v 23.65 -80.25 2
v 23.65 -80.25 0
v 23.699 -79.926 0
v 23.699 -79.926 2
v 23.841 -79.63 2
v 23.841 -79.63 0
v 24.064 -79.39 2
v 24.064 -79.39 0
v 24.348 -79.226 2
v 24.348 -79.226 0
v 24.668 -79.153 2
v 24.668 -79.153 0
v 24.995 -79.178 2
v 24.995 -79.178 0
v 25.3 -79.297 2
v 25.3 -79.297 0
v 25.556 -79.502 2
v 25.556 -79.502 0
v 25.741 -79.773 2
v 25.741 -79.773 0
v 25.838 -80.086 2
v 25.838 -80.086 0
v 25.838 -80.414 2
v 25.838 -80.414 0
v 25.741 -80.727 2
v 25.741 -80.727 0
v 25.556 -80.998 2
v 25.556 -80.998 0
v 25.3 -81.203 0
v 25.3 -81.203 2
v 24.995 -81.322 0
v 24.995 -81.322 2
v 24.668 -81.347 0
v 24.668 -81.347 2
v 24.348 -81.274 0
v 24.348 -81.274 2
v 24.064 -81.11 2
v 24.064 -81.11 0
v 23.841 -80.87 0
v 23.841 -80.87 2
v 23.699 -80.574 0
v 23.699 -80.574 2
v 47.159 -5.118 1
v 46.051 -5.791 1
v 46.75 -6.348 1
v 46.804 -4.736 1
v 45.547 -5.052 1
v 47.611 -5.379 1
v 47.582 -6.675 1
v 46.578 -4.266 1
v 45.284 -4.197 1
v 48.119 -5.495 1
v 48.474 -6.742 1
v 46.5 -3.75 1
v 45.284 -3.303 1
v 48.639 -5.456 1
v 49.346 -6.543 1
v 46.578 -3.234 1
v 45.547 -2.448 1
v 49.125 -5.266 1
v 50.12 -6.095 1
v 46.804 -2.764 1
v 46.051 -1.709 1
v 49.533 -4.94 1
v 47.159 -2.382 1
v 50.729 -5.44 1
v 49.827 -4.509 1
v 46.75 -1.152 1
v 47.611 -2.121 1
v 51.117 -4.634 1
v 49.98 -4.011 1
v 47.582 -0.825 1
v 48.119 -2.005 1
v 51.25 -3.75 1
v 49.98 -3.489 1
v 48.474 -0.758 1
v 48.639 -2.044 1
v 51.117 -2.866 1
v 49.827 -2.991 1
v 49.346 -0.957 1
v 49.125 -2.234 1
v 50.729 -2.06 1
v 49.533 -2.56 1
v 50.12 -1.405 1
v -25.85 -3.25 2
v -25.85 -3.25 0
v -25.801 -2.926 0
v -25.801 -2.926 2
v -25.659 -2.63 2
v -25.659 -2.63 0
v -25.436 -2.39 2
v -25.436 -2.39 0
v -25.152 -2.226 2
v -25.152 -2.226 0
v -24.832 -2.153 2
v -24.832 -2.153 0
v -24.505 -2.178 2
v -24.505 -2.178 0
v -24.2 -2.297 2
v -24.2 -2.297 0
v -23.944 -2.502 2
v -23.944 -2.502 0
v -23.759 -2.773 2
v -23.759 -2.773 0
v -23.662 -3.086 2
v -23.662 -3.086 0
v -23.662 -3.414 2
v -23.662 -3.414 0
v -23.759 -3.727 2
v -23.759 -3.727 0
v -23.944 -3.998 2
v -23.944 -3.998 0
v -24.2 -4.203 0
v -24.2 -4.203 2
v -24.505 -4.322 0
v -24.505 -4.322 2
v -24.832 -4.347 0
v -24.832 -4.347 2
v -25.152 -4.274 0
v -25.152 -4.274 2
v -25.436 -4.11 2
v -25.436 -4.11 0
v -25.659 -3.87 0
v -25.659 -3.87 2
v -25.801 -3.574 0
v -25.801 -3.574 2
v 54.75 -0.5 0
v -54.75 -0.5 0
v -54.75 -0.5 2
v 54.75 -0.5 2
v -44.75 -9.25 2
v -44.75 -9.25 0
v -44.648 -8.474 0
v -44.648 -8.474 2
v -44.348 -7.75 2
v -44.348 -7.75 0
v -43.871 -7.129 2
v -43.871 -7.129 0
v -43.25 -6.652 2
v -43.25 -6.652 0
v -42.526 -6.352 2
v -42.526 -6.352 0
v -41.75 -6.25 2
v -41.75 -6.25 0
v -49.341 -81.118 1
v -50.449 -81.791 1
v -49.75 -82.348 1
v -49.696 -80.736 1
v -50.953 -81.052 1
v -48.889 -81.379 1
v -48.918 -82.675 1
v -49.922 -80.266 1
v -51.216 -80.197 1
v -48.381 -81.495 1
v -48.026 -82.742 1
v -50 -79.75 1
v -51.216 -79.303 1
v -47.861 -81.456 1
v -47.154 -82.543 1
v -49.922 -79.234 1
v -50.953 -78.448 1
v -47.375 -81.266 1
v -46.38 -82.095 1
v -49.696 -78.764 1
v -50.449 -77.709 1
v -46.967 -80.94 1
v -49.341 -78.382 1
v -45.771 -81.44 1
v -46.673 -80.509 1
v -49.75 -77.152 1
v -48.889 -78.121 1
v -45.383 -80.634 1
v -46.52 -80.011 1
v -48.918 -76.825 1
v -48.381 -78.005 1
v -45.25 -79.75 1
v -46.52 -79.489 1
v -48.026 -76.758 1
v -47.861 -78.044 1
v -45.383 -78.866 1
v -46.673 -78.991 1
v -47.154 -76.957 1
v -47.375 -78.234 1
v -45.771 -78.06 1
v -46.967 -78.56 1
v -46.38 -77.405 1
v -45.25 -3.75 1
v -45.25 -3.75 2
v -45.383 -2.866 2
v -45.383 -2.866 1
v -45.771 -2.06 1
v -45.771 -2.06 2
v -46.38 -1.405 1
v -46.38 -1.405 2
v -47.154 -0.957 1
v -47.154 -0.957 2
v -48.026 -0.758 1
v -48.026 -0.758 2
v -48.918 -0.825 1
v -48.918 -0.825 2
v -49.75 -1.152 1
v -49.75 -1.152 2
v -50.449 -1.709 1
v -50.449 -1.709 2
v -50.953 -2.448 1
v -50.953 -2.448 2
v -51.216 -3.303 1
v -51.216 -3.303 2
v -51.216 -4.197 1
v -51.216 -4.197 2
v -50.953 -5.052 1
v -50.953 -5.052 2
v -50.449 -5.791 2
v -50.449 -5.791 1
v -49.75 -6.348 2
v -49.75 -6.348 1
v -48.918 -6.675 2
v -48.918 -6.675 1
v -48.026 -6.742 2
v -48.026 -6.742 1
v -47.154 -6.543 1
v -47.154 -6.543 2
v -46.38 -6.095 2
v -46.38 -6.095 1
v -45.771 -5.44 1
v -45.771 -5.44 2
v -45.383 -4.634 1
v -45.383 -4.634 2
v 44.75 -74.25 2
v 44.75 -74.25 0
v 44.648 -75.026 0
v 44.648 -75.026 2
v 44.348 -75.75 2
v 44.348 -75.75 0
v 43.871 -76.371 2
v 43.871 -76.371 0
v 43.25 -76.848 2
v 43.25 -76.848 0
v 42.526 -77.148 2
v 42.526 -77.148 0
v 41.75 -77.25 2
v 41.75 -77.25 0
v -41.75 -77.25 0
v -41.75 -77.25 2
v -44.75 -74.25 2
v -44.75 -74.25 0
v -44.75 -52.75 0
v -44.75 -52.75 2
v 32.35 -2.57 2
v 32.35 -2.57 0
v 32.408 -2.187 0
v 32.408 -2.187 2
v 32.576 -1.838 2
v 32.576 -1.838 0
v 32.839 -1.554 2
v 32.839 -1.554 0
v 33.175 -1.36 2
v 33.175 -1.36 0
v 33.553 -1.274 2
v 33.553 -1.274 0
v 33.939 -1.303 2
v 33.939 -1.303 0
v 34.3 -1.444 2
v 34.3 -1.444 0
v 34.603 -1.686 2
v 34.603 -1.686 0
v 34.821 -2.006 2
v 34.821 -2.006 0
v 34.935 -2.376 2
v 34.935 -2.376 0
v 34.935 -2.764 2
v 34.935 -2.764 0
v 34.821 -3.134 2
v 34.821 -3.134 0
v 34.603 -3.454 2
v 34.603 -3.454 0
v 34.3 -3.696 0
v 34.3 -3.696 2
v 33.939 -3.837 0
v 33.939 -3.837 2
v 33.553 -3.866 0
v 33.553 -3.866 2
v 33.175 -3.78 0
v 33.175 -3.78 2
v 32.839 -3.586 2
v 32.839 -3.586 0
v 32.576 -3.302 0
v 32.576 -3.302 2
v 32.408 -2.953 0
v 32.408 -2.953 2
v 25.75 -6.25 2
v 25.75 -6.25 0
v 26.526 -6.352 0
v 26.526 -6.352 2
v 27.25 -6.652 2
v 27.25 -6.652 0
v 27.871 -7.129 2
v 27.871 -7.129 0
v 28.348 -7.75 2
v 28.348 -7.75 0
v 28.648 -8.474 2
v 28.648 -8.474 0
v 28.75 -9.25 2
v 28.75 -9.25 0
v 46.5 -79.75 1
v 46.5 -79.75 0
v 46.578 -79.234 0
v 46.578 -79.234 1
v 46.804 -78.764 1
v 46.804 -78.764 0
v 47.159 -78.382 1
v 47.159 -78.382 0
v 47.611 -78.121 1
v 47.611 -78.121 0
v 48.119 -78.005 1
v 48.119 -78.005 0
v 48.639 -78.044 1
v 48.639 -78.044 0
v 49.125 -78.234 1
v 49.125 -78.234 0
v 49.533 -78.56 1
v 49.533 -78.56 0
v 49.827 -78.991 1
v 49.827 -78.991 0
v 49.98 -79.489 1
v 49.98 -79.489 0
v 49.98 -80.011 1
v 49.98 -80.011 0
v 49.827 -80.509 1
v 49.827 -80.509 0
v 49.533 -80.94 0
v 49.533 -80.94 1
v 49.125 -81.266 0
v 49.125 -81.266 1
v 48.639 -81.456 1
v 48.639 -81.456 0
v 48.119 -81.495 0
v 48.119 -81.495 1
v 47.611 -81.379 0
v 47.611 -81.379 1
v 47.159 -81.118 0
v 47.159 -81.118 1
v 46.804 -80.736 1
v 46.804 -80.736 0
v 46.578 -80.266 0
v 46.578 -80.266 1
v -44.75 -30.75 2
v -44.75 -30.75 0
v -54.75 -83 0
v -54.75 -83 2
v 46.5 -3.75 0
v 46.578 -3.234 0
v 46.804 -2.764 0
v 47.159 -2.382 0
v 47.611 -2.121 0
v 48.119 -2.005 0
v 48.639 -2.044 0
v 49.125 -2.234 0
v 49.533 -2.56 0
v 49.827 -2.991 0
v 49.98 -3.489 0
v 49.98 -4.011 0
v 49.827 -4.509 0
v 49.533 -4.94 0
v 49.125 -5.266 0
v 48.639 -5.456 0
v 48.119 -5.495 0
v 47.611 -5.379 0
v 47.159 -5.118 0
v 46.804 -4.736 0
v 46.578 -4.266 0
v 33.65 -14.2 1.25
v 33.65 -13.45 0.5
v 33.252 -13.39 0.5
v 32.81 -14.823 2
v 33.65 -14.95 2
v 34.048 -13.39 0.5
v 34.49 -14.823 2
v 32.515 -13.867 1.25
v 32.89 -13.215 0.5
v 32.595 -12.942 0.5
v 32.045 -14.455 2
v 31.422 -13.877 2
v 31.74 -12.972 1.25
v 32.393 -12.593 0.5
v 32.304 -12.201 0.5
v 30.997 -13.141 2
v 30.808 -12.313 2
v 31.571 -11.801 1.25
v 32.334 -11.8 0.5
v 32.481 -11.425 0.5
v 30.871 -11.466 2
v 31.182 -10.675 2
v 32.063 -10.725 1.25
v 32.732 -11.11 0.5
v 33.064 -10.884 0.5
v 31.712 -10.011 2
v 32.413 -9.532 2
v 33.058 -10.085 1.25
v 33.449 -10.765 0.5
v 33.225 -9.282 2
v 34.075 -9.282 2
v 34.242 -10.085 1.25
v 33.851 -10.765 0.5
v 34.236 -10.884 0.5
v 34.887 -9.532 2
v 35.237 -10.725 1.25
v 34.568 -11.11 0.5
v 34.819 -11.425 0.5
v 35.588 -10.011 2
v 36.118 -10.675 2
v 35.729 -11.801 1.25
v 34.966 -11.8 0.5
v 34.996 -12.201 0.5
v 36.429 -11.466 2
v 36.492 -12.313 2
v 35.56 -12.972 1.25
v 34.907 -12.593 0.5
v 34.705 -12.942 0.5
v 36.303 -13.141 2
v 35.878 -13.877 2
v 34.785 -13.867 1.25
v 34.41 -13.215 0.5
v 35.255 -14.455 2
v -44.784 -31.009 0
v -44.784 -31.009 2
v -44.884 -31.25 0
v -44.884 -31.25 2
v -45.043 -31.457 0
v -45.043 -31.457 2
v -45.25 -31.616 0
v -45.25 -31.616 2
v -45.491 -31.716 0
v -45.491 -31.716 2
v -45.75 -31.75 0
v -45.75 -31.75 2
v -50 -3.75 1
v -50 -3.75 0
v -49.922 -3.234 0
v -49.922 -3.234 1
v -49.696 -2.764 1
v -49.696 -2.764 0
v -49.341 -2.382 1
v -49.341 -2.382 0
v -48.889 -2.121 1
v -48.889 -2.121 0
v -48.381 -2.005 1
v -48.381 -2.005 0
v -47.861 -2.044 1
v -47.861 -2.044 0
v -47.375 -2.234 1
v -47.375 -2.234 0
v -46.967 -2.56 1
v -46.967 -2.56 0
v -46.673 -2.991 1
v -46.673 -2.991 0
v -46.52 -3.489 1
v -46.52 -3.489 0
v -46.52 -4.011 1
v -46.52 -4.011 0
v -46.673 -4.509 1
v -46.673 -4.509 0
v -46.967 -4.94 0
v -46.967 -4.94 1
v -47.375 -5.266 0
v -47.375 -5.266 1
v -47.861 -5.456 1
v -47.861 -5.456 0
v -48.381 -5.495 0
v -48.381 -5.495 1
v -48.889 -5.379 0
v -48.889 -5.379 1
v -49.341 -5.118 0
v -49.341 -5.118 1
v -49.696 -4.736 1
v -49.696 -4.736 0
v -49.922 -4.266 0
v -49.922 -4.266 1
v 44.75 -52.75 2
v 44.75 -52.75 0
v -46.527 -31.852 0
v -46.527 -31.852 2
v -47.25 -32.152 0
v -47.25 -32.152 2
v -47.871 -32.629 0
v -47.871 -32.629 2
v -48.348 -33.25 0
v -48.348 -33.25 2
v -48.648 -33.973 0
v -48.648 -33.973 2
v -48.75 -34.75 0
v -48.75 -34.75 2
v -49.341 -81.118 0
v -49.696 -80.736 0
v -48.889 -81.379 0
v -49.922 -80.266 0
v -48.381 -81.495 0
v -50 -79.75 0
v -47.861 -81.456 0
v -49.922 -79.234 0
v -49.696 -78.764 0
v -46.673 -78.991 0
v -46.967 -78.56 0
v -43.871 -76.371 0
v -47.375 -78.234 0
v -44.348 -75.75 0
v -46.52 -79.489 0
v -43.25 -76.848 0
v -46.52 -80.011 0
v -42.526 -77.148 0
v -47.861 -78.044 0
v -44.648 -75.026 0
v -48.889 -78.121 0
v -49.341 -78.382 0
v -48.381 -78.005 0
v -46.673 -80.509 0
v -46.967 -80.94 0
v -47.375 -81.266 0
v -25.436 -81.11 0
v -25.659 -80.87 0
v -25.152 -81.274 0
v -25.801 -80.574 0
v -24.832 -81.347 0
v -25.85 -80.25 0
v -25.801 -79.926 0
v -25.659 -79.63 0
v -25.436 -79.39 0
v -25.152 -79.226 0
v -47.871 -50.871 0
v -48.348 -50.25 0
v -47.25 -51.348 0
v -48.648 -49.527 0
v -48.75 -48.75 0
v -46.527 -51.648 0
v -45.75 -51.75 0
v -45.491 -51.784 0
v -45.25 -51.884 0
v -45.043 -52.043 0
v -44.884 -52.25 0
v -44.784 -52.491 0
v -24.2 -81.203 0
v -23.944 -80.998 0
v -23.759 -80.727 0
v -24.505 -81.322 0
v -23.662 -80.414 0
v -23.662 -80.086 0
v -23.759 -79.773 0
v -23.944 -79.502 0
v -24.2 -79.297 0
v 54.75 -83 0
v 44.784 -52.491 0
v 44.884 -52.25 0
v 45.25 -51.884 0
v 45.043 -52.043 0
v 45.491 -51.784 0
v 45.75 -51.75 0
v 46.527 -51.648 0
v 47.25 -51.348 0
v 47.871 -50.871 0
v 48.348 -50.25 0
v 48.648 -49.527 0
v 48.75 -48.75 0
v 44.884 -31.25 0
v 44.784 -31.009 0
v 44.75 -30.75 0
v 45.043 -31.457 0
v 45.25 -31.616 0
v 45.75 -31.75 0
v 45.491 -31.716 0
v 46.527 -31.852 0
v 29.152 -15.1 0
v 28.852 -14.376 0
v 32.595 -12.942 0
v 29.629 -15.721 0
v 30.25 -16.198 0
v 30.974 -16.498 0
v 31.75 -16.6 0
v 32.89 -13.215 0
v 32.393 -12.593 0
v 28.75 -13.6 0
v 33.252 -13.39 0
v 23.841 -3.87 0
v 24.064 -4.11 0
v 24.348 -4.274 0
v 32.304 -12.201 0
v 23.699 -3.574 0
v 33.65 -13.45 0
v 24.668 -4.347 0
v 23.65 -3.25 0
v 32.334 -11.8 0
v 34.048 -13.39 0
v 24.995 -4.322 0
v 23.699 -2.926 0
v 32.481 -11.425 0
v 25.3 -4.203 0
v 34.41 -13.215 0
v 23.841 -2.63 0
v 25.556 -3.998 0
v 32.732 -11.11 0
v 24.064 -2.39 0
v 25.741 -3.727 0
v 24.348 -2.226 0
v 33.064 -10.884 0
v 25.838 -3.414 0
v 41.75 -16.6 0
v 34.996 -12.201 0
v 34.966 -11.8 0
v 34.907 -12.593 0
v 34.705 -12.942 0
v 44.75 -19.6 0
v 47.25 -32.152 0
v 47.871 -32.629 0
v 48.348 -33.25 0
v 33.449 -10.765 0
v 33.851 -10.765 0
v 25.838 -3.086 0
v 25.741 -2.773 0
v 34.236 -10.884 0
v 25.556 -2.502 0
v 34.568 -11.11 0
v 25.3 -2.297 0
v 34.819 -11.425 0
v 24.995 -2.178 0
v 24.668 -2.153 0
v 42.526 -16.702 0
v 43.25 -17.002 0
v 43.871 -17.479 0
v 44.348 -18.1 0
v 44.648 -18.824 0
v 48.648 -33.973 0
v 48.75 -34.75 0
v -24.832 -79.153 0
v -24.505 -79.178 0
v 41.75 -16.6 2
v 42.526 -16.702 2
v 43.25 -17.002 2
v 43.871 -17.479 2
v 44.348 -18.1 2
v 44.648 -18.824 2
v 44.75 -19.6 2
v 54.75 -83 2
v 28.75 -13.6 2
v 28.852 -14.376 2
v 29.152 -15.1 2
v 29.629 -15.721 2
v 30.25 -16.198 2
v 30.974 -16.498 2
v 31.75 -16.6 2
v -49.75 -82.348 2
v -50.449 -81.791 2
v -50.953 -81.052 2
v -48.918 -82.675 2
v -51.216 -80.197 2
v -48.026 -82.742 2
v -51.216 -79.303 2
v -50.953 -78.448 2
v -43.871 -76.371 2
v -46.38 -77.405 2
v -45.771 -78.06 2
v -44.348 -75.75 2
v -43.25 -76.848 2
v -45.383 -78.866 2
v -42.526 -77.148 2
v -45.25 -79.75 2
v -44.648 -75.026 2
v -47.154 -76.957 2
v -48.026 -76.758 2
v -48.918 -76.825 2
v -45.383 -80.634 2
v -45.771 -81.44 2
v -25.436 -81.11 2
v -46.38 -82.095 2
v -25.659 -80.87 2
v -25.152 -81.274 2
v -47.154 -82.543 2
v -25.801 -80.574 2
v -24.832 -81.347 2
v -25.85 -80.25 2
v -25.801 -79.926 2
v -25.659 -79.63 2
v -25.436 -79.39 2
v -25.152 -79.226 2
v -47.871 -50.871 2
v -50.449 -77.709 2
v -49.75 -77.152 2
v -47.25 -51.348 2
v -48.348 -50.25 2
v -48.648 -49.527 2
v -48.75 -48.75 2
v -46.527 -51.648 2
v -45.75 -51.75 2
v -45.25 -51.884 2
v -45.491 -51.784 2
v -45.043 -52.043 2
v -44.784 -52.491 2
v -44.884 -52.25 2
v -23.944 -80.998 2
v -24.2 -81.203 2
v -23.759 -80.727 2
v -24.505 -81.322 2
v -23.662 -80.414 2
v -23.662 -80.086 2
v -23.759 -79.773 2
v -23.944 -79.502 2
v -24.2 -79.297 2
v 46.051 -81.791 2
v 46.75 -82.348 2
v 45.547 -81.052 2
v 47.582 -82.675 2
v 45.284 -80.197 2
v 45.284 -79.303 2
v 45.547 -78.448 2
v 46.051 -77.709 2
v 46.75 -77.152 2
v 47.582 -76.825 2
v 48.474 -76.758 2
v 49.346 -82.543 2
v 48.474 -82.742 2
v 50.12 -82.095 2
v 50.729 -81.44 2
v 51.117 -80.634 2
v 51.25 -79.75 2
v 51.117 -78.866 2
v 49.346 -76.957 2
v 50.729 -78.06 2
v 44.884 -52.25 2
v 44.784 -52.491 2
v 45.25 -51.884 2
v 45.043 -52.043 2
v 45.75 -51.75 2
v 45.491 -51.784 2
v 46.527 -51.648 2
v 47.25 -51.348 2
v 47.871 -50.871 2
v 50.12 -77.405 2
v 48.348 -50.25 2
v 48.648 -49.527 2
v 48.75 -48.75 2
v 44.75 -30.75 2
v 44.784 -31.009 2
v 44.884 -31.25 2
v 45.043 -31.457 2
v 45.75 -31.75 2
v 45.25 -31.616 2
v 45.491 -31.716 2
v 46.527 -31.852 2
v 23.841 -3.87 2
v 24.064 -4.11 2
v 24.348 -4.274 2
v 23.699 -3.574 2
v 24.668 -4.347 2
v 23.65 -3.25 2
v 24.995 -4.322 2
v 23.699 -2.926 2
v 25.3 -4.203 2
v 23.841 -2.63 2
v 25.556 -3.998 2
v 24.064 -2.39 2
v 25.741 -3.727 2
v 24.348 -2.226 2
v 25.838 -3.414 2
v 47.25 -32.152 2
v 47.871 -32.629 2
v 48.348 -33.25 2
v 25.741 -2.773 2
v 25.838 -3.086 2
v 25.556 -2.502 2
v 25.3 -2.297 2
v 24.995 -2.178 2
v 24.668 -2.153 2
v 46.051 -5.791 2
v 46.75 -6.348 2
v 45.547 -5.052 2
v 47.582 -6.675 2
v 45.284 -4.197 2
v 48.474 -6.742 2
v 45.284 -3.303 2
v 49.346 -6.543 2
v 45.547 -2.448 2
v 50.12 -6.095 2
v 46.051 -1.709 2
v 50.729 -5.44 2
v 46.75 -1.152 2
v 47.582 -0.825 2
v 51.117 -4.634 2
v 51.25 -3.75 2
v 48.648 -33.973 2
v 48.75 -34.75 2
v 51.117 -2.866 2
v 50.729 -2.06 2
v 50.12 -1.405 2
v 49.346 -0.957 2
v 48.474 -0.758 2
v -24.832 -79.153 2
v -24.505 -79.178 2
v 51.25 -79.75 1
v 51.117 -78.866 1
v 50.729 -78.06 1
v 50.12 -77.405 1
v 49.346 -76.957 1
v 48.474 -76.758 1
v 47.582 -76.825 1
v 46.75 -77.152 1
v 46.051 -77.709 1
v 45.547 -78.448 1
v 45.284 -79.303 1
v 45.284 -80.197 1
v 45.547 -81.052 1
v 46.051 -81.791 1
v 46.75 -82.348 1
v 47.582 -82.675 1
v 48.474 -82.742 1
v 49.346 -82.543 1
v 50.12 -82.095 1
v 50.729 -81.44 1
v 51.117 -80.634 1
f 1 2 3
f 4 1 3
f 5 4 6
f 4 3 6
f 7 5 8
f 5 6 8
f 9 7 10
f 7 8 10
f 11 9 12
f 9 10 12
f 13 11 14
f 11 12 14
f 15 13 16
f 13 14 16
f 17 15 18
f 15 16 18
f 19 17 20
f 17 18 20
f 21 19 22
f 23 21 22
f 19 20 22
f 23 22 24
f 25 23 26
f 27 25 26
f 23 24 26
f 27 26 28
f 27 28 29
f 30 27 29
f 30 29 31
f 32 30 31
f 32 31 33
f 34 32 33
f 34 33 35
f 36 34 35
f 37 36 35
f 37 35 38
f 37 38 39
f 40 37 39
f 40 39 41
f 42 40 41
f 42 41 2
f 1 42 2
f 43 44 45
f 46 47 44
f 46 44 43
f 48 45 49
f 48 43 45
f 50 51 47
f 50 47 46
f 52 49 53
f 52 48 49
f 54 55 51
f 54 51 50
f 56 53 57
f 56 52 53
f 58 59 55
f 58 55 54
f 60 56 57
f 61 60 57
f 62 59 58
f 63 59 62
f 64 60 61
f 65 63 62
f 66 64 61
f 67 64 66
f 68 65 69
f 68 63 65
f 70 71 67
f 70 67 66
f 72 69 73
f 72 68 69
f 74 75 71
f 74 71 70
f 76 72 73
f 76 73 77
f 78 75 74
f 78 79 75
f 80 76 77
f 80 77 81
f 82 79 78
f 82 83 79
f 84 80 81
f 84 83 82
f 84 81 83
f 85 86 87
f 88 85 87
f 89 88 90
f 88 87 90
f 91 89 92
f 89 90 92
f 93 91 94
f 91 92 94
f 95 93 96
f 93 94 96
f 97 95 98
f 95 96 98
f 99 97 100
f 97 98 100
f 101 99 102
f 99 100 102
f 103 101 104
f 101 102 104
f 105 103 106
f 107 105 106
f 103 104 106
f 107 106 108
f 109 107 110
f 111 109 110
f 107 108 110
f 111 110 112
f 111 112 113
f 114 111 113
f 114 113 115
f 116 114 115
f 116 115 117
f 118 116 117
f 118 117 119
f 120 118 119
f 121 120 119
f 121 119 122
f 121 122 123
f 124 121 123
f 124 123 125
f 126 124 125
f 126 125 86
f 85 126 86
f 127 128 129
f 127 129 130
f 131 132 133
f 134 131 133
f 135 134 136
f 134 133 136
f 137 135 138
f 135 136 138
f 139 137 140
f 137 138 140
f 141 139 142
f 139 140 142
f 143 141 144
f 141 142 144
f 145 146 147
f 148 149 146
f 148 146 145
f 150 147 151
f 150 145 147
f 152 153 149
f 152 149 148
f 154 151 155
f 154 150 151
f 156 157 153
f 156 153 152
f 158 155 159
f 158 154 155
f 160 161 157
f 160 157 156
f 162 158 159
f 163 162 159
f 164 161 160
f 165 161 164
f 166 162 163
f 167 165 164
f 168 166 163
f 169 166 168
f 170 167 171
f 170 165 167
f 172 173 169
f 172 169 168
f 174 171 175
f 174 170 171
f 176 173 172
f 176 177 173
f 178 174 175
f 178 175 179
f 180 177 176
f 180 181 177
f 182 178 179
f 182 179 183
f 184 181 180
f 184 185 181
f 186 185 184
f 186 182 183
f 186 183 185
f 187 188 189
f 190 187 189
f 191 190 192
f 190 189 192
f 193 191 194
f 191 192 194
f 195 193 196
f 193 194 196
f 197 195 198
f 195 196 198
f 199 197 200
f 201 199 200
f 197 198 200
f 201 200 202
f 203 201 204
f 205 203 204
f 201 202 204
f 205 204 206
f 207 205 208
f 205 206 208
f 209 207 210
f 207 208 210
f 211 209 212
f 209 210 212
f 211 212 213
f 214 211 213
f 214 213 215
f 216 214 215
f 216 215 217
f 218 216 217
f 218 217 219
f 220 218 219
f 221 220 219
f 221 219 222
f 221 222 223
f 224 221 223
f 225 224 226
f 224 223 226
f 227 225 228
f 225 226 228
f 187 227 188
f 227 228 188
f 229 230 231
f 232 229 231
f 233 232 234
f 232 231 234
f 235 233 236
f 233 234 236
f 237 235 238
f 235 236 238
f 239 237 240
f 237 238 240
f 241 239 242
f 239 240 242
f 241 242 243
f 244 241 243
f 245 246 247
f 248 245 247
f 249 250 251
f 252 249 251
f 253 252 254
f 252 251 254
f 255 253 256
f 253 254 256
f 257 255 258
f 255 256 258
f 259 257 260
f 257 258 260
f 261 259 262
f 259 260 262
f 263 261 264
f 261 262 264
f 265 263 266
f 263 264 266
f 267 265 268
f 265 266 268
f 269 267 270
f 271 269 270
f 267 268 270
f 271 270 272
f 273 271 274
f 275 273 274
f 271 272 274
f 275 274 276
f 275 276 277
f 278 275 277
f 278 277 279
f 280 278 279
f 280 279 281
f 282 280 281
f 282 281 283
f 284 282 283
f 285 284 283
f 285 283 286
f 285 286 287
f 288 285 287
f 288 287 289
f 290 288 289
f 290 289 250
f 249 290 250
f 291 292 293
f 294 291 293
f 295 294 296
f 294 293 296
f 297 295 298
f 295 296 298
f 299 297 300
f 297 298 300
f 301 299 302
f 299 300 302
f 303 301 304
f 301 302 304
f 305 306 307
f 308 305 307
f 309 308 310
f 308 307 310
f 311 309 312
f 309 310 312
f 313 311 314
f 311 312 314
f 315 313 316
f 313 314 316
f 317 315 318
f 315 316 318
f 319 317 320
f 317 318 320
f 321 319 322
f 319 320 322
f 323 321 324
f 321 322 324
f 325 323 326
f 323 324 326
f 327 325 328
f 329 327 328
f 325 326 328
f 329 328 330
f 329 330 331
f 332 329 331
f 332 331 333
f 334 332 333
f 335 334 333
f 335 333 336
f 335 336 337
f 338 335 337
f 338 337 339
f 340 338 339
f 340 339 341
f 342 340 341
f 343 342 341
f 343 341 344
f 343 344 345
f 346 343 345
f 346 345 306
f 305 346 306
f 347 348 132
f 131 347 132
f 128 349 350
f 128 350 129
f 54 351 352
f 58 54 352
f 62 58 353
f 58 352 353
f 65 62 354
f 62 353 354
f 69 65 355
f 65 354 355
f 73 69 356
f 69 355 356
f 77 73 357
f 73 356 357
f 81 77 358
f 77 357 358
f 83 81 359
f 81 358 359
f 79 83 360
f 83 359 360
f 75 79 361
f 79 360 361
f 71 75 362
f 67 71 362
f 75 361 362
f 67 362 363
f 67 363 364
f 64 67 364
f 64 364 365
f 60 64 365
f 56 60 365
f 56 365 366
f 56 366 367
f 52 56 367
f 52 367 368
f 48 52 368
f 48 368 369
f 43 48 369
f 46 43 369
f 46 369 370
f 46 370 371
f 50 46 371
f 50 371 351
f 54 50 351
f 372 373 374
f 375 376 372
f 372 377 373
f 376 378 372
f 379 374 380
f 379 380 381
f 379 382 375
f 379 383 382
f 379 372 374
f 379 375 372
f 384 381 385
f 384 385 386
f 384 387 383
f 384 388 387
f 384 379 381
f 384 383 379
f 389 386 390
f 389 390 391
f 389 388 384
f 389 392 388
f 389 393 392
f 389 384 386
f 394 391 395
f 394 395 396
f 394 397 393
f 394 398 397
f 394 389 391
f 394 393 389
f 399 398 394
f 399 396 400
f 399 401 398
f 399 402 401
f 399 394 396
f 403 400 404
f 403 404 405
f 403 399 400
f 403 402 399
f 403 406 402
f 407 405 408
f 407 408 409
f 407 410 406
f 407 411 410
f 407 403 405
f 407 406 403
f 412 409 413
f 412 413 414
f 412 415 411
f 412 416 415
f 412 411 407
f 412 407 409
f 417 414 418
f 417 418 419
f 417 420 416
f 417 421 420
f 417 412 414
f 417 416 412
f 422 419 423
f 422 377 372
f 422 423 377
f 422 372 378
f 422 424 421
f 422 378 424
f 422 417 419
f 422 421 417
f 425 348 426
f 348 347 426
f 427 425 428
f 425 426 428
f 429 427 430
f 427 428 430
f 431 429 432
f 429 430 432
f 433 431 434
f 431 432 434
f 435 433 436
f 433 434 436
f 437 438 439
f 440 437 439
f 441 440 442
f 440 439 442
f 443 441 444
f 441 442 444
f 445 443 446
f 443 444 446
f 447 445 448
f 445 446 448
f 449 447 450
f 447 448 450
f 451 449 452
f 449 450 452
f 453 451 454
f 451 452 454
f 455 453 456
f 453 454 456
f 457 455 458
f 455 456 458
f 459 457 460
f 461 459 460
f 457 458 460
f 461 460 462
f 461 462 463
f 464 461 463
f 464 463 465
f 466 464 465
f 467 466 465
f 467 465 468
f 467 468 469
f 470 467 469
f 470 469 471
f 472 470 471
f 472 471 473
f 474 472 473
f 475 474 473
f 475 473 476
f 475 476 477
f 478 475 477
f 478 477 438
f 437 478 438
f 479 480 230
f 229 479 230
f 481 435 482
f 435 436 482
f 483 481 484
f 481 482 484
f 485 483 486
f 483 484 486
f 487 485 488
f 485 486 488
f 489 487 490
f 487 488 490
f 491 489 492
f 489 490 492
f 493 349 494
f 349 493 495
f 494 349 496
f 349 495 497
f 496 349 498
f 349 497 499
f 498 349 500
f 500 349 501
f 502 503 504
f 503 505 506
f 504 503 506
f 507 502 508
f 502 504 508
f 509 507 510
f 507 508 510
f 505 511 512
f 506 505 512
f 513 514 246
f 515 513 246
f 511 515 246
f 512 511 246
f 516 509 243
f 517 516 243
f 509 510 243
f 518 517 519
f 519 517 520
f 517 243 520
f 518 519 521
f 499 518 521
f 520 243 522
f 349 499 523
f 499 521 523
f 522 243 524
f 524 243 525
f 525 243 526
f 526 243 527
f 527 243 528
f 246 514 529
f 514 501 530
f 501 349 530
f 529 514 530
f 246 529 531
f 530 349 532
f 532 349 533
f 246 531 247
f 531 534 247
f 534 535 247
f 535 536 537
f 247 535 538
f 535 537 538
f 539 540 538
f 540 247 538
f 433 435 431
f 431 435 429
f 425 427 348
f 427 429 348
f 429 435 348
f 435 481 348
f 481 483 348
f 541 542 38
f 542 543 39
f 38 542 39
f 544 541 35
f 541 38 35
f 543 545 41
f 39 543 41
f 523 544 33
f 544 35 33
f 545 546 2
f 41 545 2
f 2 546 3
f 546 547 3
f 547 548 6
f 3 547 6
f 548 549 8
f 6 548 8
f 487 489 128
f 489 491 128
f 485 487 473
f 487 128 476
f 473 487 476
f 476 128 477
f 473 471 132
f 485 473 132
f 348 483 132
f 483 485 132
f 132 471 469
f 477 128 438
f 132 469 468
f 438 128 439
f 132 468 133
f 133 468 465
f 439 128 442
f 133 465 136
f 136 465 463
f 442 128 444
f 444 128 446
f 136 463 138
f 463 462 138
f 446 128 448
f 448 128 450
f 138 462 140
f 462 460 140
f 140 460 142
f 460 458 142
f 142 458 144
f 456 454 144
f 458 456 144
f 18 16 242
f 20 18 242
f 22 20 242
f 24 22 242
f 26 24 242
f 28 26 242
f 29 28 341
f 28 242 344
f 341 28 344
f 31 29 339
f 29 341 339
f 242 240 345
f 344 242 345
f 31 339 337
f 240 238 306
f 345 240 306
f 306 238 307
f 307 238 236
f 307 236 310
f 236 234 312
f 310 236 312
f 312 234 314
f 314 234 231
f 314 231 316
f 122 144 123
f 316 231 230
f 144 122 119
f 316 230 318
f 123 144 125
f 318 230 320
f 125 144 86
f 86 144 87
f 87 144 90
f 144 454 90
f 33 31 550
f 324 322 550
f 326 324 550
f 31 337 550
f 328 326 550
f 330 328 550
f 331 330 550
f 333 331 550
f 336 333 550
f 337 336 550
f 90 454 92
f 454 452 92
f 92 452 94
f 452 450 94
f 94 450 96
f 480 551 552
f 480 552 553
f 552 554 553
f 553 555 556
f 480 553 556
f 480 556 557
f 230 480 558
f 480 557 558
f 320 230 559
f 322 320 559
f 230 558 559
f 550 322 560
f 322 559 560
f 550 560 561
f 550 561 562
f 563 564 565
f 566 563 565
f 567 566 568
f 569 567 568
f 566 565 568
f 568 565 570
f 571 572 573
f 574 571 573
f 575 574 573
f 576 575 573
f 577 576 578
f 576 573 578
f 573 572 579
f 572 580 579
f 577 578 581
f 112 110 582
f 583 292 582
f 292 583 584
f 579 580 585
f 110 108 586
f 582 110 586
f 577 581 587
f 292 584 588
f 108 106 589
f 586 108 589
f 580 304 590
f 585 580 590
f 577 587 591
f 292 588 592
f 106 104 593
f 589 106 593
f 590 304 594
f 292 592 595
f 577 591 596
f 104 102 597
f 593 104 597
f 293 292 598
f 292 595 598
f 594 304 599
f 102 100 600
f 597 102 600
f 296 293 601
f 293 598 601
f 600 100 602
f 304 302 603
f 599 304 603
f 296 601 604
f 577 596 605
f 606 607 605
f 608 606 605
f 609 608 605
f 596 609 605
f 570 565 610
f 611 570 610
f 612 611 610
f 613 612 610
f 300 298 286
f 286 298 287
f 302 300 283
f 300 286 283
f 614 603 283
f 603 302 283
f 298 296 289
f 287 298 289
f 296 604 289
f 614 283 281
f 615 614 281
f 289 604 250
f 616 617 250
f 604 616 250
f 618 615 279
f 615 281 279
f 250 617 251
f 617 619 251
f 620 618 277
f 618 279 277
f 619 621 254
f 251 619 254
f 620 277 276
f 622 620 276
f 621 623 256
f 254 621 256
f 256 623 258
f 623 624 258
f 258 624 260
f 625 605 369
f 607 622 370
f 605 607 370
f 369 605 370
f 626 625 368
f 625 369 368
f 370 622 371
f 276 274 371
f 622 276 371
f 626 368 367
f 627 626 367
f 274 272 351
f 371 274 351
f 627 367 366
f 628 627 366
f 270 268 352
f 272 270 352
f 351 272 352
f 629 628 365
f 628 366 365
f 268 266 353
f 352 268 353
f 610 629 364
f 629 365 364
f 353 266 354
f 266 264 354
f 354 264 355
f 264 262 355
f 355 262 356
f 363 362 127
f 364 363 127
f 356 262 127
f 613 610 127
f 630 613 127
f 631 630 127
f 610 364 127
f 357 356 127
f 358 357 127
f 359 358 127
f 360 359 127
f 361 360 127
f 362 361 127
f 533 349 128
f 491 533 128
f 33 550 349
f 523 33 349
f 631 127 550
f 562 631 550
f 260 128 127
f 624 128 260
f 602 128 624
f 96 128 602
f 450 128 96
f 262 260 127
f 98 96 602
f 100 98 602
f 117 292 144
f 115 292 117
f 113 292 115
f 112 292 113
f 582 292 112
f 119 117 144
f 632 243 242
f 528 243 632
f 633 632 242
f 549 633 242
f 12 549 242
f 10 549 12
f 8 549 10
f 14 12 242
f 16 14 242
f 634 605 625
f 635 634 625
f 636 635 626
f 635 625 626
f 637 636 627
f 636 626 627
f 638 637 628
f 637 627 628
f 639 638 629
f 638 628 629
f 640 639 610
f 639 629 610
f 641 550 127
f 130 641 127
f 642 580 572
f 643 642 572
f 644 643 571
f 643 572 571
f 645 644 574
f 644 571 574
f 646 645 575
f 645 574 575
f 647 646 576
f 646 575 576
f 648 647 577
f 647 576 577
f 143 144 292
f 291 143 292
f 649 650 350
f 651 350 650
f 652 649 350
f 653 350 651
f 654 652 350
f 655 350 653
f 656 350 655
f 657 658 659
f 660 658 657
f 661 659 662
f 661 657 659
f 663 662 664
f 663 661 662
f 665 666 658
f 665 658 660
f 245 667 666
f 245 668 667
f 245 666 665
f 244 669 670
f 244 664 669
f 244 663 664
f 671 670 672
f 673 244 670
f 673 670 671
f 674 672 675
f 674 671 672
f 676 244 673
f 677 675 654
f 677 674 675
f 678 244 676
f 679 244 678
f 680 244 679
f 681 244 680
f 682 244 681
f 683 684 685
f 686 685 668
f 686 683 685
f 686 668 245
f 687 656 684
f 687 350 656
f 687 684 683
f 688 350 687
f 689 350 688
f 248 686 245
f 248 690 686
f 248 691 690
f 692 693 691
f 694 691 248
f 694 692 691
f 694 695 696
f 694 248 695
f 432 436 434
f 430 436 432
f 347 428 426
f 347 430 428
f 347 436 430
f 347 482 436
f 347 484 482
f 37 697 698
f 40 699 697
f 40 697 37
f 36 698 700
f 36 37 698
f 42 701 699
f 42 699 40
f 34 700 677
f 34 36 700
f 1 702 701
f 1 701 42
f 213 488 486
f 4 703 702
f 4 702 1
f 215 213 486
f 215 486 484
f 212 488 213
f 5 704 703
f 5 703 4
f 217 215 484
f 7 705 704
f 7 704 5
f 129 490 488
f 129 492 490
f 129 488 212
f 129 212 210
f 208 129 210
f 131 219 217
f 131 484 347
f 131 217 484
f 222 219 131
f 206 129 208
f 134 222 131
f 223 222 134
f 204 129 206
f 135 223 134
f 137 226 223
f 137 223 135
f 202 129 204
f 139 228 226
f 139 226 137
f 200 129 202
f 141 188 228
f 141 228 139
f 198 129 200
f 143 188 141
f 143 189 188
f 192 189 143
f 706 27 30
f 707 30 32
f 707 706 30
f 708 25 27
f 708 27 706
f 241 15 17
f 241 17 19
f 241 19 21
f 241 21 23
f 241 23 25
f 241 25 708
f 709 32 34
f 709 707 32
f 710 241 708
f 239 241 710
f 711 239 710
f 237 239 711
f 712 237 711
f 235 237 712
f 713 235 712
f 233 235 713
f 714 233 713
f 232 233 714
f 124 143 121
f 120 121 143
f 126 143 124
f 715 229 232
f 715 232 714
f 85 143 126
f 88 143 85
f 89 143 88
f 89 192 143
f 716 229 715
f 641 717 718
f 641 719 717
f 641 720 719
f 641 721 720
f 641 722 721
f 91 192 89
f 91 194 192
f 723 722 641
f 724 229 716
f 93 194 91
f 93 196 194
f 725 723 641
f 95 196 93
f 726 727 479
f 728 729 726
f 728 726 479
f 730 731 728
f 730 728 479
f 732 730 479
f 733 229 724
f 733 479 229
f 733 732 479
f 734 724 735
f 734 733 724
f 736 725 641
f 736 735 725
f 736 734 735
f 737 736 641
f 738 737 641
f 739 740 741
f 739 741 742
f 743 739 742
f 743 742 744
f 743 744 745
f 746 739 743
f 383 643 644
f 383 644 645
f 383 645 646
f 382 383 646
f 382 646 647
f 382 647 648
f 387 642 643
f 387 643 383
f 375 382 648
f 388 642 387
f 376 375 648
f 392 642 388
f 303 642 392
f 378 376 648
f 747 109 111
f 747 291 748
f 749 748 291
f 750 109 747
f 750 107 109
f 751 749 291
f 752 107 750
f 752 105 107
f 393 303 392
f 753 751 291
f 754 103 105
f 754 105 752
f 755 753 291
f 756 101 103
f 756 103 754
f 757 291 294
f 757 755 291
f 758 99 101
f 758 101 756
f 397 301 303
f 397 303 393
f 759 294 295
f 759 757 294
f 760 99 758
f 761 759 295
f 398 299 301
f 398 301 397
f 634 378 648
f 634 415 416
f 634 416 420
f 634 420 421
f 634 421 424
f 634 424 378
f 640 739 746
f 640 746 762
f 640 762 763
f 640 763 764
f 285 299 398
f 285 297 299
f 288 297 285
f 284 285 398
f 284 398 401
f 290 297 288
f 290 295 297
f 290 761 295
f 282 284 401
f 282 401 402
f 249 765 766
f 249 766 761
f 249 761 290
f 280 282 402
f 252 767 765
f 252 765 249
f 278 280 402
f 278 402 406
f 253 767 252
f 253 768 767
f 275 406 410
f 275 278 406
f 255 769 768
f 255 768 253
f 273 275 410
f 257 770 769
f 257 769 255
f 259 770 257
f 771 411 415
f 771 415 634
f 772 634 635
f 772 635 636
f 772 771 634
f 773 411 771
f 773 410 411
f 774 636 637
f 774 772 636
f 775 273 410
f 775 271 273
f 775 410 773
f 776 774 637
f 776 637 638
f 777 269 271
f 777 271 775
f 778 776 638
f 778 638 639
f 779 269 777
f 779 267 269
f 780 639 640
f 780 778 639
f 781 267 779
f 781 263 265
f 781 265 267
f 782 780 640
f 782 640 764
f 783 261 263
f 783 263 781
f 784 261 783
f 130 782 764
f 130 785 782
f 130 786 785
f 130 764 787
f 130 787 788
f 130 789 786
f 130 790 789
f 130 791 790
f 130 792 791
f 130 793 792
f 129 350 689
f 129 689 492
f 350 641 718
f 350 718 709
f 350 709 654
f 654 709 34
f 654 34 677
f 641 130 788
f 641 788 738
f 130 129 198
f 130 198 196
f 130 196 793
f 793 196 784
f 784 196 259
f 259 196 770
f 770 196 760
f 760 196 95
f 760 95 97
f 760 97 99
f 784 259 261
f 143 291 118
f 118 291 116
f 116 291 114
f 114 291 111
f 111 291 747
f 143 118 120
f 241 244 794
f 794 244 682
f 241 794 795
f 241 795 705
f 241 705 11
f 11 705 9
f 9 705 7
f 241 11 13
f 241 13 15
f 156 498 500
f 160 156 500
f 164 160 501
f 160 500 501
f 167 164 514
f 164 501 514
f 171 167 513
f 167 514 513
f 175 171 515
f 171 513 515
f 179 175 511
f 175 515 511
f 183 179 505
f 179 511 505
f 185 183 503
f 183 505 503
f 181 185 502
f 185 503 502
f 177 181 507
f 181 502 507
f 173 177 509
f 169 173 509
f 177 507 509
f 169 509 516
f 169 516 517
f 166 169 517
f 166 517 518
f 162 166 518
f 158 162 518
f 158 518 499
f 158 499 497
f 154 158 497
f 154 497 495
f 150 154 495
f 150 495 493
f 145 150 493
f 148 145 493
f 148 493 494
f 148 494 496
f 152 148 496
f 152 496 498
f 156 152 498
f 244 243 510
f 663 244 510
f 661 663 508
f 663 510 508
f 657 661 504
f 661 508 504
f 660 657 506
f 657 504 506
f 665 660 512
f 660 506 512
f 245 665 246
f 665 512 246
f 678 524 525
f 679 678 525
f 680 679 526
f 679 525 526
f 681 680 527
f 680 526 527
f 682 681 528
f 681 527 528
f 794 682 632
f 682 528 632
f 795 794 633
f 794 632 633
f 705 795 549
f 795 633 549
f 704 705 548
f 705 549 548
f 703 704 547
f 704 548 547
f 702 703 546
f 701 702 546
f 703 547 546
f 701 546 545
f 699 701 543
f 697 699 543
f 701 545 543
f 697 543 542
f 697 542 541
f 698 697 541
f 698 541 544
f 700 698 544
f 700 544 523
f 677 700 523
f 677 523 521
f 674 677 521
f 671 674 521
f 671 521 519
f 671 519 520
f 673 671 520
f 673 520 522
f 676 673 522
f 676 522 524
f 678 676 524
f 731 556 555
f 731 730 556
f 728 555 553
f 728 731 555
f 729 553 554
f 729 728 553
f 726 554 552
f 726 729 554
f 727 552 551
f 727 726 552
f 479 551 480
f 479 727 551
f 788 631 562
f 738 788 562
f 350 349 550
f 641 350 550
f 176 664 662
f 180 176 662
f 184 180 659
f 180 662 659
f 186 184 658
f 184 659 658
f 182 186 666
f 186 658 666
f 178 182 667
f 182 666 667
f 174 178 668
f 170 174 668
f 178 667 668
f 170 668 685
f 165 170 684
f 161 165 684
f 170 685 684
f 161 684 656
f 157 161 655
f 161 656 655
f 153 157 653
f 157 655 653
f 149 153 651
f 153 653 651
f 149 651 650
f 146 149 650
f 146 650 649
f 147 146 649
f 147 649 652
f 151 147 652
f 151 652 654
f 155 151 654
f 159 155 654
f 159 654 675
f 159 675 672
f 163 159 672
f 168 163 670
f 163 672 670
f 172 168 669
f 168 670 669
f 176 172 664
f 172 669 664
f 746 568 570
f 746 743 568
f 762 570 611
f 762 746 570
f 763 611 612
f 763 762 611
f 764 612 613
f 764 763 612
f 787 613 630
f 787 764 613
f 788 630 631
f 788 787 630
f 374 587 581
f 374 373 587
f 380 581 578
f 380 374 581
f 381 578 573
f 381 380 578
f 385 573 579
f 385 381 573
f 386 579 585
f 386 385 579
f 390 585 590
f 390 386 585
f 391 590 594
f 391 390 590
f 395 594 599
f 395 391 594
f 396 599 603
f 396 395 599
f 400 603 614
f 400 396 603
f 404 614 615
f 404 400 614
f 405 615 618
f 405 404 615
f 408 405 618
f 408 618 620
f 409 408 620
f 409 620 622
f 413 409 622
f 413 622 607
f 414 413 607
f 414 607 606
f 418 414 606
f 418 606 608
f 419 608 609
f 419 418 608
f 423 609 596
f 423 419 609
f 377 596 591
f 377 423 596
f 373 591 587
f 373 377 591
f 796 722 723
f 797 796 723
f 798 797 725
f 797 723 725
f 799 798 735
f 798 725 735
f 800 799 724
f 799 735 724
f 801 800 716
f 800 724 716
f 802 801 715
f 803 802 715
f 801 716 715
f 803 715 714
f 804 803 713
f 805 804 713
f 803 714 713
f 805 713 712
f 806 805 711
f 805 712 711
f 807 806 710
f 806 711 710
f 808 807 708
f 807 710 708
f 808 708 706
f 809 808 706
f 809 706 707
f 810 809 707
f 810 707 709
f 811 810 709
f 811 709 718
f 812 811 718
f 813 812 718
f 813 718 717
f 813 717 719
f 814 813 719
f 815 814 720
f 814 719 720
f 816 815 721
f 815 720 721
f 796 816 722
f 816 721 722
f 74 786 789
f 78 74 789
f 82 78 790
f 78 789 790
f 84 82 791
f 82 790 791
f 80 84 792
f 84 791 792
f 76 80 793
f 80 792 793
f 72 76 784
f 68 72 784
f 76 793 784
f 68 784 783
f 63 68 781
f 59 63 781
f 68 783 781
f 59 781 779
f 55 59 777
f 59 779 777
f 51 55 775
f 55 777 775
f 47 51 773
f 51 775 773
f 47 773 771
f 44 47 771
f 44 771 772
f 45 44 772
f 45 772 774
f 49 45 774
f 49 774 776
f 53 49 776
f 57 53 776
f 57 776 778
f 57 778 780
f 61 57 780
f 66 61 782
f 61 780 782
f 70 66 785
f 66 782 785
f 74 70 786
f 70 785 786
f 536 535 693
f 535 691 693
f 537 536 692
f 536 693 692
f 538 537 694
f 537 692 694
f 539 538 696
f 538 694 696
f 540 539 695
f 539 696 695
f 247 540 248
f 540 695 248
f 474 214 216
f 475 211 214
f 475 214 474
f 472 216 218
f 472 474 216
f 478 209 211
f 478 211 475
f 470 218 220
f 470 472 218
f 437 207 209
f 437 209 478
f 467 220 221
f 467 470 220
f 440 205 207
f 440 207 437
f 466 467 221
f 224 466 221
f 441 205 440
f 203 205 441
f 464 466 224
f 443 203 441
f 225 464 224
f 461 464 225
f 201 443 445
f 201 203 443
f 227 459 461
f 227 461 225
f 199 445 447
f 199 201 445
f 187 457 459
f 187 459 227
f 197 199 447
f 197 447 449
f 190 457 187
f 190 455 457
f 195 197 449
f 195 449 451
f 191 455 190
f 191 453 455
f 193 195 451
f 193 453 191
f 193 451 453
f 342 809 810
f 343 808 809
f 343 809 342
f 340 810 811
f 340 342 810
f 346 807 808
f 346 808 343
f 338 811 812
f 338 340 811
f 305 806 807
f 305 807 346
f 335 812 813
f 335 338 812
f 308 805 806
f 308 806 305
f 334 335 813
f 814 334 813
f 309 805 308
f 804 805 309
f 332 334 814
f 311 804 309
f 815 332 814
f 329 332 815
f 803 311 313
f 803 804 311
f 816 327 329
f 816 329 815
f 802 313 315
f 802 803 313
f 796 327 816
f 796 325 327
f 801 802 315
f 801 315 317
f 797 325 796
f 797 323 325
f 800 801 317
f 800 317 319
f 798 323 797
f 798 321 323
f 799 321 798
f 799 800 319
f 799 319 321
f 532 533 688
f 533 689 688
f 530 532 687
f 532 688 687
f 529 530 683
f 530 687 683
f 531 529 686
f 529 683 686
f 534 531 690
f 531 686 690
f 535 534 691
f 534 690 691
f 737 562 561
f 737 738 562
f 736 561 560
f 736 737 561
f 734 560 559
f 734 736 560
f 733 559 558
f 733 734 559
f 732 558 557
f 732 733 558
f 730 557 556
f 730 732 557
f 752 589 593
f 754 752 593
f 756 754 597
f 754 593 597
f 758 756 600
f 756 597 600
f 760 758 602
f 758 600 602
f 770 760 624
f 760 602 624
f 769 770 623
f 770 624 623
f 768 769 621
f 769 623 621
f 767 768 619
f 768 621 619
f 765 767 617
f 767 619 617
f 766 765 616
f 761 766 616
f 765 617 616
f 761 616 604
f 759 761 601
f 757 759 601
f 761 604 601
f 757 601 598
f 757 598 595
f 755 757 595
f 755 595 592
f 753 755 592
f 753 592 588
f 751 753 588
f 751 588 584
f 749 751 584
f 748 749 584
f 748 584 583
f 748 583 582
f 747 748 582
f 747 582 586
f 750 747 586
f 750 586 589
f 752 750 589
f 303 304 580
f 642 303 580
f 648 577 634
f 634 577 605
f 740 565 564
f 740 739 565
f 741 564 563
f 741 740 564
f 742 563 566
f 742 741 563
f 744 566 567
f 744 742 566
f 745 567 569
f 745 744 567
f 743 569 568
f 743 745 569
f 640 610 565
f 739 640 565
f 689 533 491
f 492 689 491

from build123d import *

# Parameters (mm, degrees)
SKETCH1_W                  = 109.5
SKETCH1_H                  = 82.5
BOSS_EXTRUDE1_DEPTH        = 2
F_3_5_3_5_DIAMETER_HOLE1_D = 3.5
F_2_6_2_6_DIAMETER_HOLE1_D = 2.6
SKETCH9_R                  = 3
CUT_EXTRUDE1_DEPTH         = 1
F_2_2_2_2_DIAMETER_HOLE1_D = 2.2
FILLET1_R                  = 1
FILLET2_R                  = 3


with BuildPart() as part:
    # Sketch1 → Boss-Extrude1 (new body)
    with BuildSketch(Plane.XY):
        with Locations((0, -41.75)):
            Rectangle(SKETCH1_W, SKETCH1_H)
        with BuildLine():
            Line((28.75, -9.25), (28.75, -13.6))
            ThreePointArc((28.75, -13.6), (29.628679656, -15.721320344), (31.75, -16.6))
            Line((31.75, -16.6), (41.75, -16.6))
            ThreePointArc((41.75, -16.6), (43.871320344, -17.478679656), (44.75, -19.6))
            Line((44.75, -19.6), (44.75, -31.75))
            Line((44.75, -31.75), (48.75, -31.75))
            Line((48.75, -31.75), (48.75, -41.75))
            Line((48.75, -41.75), (48.75, -51.75))
            Line((48.75, -51.75), (44.75, -51.75))
            Line((44.75, -51.75), (44.75, -74.25))
            ThreePointArc((44.75, -74.25), (43.871320344, -76.371320344), (41.75, -77.25))
            Line((41.75, -77.25), (-41.75, -77.25))
            ThreePointArc((-41.75, -77.25), (-43.871320344, -76.371320344), (-44.75, -74.25))
            Line((-44.75, -74.25), (-44.75, -51.75))
            Line((-44.75, -51.75), (-48.75, -51.75))
            Line((-48.75, -51.75), (-48.75, -31.75))
            Line((-48.75, -31.75), (-44.75, -31.75))
            Line((-44.75, -31.75), (-44.75, -9.25))
            ThreePointArc((-44.75, -9.25), (-43.871320344, -7.128679656), (-41.75, -6.25))
            Line((-41.75, -6.25), (25.75, -6.25))
            ThreePointArc((25.75, -6.25), (27.871320344, -7.128679656), (28.75, -9.25))
        make_face(mode=Mode.SUBTRACT)
    extrude(amount=BOSS_EXTRUDE1_DEPTH)

    # Ø3.5 (3.5) Diameter Hole1 (through all)
    with Locations(Plane.XY.offset(2)):
        with Locations((-48.25, -3.75), (-48.25, -79.75), (48.25, -79.75), (48.25, -3.75)):
            Hole(F_3_5_3_5_DIAMETER_HOLE1_D / 2)

    # Sketch5 → CSK for M2.5 Flat Countersunk Head Screw1 (revolve, cut)
    with BuildSketch(Plane(origin=(33.65, -12.1, 2), x_dir=(0, -1, 0), z_dir=(1, 0, 0))):
        Polygon((0, 0), (0, 2), (1.35, 2), (1.35, 1.5), (2.85, 0), align=None)
    revolve(axis=Axis((33.65, -12.1, 8.35), (0, 0, -1)), mode=Mode.SUBTRACT)

    # Ø2.6 (2.6) Diameter Hole1 (through all)
    with Locations(Plane.XY.offset(2)):
        with Locations((33.65, -2.57)):
            Hole(F_2_6_2_6_DIAMETER_HOLE1_D / 2)

    # Sketch9 → Cut-Extrude1 (cut)
    with BuildSketch(Plane.XY.offset(2)):
        with Locations((-48.25, -3.75)):
            Circle(SKETCH9_R)
        with Locations((48.25, -3.75)):
            Circle(SKETCH9_R)
        with Locations((48.25, -79.75)):
            Circle(SKETCH9_R)
        with Locations((-48.25, -79.75)):
            Circle(SKETCH9_R)
    extrude(amount=-CUT_EXTRUDE1_DEPTH, mode=Mode.SUBTRACT)

    # Ø2.2 (2.2) Diameter Hole1 (through all)
    with Locations(Plane.XY.offset(2)):
        with Locations((-24.75, -3.25), (24.75, -3.25), (-24.75, -80.25), (24.75, -80.25)):
            Hole(F_2_2_2_2_DIAMETER_HOLE1_D / 2)

    # Fillet1
    fillet1_edges = [part.edges().sort_by_distance(p)[0] for p in [
        (-44.75, -31.75, 1),
        (-44.75, -51.75, 1),
        (44.75, -51.75, 1),
        (44.75, -31.75, 1),
    ]]
    fillet(fillet1_edges, radius=FILLET1_R)

    # Fillet2
    fillet2_edges = [part.edges().sort_by_distance(p)[0] for p in [
        (48.75, -31.75, 1),
        (48.75, -51.75, 1),
        (-48.75, -51.75, 1),
        (-48.75, -31.75, 1),
    ]]
    fillet(fillet2_edges, radius=FILLET2_R - 0.0001)  # a hair under: the kernel refuses the full size


solid = part.part
